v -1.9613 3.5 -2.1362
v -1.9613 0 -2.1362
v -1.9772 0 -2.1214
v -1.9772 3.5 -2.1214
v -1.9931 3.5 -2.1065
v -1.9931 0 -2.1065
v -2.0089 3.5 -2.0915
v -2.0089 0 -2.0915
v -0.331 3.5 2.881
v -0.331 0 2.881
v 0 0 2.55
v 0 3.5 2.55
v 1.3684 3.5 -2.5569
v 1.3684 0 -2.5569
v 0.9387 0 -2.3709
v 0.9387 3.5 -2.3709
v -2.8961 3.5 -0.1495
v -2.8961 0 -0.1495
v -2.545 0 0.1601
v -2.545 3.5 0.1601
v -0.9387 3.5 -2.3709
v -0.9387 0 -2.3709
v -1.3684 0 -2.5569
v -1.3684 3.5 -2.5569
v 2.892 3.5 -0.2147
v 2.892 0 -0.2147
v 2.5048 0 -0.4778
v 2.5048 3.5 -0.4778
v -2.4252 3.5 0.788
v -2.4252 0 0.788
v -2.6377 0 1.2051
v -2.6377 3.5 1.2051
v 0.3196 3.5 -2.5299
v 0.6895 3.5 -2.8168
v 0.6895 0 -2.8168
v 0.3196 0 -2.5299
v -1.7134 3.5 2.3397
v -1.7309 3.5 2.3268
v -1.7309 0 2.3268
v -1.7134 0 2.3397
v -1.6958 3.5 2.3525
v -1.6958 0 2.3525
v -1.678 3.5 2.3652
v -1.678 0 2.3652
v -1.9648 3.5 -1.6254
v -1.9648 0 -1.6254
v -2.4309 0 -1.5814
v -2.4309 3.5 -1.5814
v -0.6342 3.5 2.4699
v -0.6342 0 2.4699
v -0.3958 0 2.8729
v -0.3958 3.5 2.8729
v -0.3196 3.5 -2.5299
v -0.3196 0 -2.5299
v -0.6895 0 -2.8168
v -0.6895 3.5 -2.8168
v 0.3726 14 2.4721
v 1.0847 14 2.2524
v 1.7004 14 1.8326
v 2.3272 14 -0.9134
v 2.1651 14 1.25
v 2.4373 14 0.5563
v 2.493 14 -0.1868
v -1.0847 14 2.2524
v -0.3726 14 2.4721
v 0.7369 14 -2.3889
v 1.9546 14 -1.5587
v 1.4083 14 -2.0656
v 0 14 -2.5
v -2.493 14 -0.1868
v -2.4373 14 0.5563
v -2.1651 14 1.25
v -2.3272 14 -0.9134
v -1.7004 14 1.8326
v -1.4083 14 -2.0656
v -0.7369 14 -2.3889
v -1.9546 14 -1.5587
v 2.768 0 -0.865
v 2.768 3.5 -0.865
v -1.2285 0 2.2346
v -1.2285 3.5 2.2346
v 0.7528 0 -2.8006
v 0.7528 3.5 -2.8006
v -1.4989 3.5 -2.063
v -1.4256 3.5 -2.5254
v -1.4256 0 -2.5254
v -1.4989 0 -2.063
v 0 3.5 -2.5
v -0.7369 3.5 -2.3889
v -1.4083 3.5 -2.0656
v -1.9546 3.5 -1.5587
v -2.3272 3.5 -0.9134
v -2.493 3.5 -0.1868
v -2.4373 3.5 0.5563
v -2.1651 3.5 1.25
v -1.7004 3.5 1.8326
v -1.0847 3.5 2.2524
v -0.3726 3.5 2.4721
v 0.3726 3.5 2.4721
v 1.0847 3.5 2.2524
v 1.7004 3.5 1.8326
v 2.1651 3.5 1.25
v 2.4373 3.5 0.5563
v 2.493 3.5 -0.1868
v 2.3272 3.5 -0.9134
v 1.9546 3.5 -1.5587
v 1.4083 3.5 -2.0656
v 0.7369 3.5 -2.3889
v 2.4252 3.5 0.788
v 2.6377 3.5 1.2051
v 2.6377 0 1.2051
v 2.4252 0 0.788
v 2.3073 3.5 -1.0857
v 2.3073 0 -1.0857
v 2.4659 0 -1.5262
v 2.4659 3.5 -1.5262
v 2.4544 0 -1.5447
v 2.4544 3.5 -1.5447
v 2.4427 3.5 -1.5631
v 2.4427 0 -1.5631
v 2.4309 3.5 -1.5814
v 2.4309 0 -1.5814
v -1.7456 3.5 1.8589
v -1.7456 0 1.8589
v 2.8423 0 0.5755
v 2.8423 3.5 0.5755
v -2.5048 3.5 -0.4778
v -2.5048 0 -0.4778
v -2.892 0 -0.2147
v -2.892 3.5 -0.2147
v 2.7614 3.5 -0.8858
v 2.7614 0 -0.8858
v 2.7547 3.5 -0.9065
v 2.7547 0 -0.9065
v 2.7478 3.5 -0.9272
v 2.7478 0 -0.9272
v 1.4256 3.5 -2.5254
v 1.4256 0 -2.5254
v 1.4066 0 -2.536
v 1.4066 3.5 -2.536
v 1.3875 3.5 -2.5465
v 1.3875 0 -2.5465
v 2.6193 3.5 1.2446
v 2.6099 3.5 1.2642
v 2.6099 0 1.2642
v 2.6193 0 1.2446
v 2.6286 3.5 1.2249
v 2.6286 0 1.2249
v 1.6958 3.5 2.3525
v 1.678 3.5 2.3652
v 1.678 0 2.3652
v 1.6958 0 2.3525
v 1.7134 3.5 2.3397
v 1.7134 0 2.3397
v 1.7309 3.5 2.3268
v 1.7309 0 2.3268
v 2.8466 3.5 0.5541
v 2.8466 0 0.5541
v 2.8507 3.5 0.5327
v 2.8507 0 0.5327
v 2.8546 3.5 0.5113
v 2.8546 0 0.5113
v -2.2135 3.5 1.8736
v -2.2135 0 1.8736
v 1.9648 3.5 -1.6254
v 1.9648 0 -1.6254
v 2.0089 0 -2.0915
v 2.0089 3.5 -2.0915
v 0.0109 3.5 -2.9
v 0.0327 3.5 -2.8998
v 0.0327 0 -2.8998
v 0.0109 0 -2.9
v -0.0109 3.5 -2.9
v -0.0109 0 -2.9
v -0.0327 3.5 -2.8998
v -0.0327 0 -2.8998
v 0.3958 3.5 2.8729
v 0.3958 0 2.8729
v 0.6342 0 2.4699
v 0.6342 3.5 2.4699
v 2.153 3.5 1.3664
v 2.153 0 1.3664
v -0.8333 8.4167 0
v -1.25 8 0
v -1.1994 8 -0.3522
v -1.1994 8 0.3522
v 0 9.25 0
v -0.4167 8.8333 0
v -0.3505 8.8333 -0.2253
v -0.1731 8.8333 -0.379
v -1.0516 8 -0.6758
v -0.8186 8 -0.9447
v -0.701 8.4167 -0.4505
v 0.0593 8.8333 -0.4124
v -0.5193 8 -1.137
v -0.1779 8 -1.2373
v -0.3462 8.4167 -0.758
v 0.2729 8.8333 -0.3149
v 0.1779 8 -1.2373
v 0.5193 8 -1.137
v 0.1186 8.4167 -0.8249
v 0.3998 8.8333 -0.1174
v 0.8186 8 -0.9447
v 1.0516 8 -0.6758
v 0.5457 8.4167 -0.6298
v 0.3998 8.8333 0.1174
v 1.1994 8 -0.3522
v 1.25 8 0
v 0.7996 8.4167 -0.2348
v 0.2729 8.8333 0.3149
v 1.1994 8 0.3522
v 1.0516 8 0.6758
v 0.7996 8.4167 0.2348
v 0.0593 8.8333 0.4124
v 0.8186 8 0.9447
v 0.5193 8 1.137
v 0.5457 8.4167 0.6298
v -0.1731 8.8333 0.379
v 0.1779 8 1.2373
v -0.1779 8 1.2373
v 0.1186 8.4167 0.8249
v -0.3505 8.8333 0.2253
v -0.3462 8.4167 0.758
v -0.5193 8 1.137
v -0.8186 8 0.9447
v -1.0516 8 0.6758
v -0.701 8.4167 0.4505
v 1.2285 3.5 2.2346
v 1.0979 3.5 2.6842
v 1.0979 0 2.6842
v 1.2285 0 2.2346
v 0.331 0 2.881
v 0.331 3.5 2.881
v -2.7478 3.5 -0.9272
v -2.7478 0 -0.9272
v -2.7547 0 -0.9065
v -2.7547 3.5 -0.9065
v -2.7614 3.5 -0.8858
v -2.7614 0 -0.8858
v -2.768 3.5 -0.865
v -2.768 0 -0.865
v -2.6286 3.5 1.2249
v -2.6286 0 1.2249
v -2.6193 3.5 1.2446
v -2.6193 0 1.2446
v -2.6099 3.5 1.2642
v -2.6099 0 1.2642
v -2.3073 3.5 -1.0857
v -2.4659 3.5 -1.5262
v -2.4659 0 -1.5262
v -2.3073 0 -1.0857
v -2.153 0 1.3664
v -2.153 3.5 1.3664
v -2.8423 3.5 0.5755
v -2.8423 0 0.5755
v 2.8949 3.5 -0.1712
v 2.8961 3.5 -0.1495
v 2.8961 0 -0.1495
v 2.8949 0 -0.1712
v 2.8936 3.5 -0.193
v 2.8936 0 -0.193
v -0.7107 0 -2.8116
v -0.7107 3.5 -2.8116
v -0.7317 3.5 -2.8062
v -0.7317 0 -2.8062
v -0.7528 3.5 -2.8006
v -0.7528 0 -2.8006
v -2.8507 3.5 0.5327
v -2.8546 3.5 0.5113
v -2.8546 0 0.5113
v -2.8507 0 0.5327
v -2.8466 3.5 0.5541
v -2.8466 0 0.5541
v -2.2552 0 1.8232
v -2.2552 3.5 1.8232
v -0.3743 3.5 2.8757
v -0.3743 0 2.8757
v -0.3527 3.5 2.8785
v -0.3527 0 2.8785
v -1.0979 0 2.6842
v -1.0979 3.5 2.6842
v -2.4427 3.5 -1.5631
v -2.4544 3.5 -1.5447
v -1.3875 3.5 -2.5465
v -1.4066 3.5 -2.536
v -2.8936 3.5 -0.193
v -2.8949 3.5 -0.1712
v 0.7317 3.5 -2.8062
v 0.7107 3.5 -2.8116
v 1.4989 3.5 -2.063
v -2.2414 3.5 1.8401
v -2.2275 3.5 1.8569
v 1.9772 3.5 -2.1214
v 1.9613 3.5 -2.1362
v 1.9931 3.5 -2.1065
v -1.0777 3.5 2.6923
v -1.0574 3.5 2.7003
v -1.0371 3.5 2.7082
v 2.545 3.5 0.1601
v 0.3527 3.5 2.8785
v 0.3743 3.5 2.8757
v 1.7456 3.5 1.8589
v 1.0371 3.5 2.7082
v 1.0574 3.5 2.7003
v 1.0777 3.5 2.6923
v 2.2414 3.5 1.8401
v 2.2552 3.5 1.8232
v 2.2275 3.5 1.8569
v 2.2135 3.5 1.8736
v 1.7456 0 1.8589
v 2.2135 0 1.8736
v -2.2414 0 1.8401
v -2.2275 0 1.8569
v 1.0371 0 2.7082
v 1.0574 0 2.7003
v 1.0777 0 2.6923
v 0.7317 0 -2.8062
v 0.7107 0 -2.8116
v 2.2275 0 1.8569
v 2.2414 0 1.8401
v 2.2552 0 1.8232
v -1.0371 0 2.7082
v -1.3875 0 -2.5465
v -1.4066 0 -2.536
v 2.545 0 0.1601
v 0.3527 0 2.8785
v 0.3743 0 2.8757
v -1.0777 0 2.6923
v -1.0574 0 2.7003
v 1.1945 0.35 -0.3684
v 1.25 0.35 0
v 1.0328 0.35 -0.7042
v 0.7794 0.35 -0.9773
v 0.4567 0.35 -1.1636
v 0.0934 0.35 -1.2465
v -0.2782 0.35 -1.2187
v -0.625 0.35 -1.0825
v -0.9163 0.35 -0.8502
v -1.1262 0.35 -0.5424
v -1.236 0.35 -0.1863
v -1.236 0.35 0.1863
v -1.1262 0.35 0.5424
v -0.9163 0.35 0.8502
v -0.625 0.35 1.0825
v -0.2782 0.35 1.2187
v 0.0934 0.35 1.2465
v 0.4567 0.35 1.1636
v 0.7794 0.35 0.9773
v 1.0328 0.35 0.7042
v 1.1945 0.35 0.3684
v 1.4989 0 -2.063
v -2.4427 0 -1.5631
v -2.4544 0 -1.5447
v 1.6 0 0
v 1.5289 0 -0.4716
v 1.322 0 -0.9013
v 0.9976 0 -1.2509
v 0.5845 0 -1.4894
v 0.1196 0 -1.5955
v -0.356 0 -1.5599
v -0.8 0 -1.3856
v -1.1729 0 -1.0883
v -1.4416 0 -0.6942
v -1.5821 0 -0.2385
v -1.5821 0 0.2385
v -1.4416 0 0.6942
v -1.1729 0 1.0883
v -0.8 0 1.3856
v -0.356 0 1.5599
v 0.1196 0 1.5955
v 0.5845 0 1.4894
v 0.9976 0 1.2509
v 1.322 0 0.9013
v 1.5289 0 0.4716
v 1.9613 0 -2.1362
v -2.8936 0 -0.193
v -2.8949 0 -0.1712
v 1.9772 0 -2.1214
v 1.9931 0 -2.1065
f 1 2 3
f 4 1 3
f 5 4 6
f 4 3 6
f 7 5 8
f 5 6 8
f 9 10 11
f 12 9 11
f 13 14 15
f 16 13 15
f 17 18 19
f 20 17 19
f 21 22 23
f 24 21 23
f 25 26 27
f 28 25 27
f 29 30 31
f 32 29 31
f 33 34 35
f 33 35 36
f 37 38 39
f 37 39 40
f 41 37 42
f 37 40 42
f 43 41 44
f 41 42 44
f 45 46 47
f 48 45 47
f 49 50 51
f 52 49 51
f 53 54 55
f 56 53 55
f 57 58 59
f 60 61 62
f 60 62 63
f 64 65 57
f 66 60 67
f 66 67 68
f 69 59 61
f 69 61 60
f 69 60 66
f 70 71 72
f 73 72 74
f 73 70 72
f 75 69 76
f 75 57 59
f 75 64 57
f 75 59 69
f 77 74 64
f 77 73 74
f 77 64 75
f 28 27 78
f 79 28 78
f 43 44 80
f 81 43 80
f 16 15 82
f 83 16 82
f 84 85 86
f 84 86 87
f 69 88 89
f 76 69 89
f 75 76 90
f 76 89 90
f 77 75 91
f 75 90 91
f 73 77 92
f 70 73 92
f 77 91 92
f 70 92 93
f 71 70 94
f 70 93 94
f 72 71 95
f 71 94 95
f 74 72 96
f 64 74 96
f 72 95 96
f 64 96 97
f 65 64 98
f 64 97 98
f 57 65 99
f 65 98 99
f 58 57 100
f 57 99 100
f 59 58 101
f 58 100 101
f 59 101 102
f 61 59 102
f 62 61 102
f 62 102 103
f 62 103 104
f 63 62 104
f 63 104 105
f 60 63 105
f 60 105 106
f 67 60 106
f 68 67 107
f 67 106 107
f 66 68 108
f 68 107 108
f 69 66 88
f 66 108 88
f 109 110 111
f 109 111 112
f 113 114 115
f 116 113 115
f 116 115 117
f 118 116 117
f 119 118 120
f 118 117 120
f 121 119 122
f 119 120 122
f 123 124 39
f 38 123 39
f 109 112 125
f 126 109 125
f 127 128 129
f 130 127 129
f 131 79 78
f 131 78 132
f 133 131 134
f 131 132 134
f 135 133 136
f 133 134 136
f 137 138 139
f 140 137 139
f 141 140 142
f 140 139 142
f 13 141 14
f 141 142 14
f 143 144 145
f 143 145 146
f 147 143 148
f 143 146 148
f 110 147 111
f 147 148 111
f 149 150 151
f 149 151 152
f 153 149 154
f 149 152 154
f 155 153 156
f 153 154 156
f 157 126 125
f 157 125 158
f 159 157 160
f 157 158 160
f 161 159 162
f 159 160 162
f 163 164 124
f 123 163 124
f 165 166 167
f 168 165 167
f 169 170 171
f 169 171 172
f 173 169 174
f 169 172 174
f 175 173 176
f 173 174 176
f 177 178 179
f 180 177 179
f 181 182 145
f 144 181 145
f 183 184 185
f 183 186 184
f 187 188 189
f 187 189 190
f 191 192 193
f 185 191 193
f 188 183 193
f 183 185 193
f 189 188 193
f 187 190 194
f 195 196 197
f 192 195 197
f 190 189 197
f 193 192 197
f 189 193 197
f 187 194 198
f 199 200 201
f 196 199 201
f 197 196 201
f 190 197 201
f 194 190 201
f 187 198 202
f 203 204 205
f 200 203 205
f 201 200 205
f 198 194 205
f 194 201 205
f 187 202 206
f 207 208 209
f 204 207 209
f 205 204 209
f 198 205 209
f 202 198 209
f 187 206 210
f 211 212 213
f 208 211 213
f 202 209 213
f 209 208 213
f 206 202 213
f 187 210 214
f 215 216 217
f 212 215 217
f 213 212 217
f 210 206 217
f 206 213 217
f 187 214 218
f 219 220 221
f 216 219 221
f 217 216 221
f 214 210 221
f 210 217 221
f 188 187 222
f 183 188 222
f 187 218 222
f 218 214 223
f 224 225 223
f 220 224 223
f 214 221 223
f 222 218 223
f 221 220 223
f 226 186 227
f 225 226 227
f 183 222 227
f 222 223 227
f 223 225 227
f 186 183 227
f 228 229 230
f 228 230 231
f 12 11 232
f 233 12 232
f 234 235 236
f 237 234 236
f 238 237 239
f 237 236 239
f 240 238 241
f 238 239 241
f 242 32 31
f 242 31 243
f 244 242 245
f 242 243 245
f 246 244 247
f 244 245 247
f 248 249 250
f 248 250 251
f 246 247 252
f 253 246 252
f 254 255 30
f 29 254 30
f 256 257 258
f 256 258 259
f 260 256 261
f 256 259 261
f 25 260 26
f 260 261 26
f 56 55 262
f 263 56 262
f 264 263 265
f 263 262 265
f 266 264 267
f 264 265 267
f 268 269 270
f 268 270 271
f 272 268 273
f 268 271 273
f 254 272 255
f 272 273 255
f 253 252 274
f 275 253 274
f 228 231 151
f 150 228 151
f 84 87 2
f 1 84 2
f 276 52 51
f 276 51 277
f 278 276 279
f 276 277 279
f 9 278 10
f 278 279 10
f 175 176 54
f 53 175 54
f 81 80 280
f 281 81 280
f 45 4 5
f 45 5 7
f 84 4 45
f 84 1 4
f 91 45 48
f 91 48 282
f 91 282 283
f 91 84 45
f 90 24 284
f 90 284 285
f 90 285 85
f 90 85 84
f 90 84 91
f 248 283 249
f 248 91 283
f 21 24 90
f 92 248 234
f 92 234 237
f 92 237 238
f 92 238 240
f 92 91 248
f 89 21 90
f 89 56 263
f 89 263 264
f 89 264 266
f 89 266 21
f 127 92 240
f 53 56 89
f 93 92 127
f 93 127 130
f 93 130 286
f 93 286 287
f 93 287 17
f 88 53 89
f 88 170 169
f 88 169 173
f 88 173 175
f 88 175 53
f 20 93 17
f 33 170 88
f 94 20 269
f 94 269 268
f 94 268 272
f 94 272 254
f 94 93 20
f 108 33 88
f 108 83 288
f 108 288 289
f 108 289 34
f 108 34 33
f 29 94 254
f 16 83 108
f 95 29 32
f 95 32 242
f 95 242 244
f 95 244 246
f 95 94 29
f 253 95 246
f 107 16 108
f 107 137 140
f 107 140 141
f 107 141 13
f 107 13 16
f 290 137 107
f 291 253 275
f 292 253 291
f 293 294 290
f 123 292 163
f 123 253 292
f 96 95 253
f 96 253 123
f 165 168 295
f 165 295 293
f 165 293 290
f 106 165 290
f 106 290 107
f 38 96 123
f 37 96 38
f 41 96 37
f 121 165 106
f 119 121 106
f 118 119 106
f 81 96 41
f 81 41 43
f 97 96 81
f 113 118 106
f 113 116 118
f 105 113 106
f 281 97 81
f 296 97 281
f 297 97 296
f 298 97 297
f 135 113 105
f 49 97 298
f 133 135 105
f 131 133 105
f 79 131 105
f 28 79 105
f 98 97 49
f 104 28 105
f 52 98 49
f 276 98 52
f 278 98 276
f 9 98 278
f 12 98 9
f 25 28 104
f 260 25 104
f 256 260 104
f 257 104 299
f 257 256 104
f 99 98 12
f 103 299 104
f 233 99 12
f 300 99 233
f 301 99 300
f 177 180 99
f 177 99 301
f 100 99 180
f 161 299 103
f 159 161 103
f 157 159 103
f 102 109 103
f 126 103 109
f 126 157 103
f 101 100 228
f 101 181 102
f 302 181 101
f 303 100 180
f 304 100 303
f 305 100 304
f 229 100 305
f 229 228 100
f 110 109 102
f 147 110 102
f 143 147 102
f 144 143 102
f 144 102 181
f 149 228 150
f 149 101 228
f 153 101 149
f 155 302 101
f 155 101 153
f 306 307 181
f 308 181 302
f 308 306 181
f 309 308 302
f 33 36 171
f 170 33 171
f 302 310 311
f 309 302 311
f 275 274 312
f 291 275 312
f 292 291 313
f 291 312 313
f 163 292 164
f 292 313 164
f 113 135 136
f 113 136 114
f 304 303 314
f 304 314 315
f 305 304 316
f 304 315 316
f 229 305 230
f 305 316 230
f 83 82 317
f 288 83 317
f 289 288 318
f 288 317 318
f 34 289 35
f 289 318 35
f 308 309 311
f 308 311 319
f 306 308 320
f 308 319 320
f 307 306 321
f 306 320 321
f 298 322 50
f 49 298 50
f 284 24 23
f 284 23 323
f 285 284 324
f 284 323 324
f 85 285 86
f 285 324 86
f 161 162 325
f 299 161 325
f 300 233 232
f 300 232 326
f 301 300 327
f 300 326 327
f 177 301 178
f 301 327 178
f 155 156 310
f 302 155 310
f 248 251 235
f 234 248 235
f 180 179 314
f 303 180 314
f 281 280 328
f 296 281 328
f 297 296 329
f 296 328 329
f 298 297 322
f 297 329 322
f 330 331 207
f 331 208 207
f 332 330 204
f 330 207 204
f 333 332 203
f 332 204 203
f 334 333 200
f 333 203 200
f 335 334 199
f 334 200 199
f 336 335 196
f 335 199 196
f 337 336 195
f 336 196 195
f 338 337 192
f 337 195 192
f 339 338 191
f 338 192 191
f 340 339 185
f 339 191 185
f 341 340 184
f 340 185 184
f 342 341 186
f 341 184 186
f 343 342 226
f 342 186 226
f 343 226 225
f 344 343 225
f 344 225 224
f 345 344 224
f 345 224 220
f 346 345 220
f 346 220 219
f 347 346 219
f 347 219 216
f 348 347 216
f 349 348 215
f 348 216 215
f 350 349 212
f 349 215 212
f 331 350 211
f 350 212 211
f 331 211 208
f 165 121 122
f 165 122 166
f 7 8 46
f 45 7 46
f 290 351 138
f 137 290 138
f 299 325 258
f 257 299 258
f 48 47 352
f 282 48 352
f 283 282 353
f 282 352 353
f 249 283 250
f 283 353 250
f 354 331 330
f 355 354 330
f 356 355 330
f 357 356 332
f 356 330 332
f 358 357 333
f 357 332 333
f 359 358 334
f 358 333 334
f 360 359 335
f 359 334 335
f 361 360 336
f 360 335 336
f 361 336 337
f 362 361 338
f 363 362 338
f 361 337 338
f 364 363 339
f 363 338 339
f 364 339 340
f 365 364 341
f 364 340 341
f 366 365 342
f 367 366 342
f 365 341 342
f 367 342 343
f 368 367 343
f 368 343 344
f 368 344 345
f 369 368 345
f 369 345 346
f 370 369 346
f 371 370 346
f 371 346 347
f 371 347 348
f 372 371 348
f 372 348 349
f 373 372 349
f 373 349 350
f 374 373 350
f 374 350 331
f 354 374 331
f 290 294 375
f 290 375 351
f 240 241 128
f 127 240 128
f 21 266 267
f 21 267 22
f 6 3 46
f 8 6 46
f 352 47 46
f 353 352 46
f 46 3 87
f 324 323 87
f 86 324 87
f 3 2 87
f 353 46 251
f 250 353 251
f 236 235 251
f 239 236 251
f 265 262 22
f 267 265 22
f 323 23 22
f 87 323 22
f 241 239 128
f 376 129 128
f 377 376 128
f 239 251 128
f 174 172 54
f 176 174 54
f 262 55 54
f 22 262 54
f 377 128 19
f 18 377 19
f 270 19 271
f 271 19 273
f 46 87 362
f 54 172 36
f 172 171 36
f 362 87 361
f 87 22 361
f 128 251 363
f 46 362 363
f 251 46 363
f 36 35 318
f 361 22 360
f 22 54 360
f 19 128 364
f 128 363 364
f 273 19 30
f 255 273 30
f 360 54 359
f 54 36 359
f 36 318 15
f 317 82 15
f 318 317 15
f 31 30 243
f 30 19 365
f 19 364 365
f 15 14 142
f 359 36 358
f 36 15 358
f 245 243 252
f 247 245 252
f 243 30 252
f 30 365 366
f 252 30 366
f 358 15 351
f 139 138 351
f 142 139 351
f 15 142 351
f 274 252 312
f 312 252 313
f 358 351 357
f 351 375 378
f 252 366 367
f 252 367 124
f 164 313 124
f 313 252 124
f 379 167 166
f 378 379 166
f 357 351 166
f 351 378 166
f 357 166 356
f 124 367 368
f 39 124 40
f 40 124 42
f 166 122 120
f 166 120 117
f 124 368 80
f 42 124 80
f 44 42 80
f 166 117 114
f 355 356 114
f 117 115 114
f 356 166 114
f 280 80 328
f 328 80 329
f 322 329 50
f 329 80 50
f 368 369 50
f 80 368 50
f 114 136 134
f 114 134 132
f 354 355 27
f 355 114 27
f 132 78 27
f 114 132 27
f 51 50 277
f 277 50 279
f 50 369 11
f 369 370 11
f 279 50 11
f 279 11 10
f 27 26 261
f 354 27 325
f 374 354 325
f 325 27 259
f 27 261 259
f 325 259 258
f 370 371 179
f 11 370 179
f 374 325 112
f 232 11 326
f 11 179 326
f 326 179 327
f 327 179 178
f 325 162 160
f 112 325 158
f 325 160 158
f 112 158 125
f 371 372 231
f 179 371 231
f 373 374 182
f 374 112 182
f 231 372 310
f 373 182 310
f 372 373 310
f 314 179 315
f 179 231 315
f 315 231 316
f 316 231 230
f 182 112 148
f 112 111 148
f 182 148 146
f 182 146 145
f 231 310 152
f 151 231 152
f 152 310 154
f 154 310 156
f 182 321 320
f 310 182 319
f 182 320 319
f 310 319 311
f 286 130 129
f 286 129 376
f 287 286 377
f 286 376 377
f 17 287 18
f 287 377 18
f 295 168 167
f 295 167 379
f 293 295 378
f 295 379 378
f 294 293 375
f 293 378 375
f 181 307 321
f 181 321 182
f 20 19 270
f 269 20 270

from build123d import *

# Parameters (mm, degrees)
SKETCH_1_R                   = 2.9
EXTRUDE_1_DEPTH              = 3.5
SKETCH_2_R                   = 2.5
EXTRUDE_2_DEPTH              = 10.5
CUT_EXTRUDE_1_DEPTH          = 3.5
HOLE_WIZARD_M3_1_D           = 2.5
HOLE_WIZARD_M3_1_DEPTH       = 8
HOLE_WIZARD_M3_1_CSINK_D     = 3.2
HOLE_WIZARD_M3_1_CSINK_ANGLE = 90
HOLE_WIZARD_M3_1_TIP         = 1.25


with BuildPart() as part:
    # 草图1 → 凸台-拉伸1 (new body)
    with BuildSketch(Plane(origin=(0, 0, 0), x_dir=(1, 0, 0), z_dir=(0, 1, 0))):
        with Locations(Location((0, 0, 0), (0, 0, 270))):
            Circle(SKETCH_1_R)
    extrude(amount=EXTRUDE_1_DEPTH)

    # 草图2 → 凸台-拉伸2 (add)
    with BuildSketch(Plane(origin=(0, 3.5, 0), x_dir=(1, 0, 0), z_dir=(0, 1, 0))):
        with Locations(Location((0, 0, 0), (0, 0, 90))):
            Circle(SKETCH_2_R)
    extrude(amount=EXTRUDE_2_DEPTH)

    # 草图3 → 切除-拉伸1 (cut)
    with BuildSketch(Plane.XZ):
        Polygon((0, 2.55), (0.366495157, 2.916495157), (-0.366495157, 2.916495157), align=None)
        Polygon((0.634159212, 2.469887061), (1.080283889, 2.733724459), (0.370321814, 2.916011738), align=None)
        Polygon((1.228471869, 2.234582034), (1.726194412, 2.3791838), (1.083870103, 2.732304577), align=None)
        Polygon((1.74559512, 1.85887), (2.263641791, 1.875150272), (1.729314848, 2.37691667), align=None)
        Polygon((2.15303621, 1.366358327), (2.658856231, 1.253294157), (2.26610038, 1.872178348), align=None)
        Polygon((2.425194117, 0.787993336), (2.887004956, 0.55268896), (2.660498492, 1.249804175), align=None)
        Polygon((2.544968157, 0.160115825), (2.933752541, -0.182643716), (2.887727699, 0.548900209), align=None)
        Polygon((2.504832489, -0.477822352), (2.796161665, -0.906500217), (2.933510354, -0.186493176), align=None)
        Polygon((2.307308984, -1.085737193), (2.482877668, -1.573397974), (2.794969765, -0.910168509), align=None)
        Polygon((1.964808769, -1.625431174), (2.013585336, -2.141433351), (2.480810946, -1.576654607), align=None)
        Polygon((1.498852393, -2.062993336), (1.417772031, -2.574914594), (2.010773652, -2.144073698), align=None)
        Polygon((0.938717609, -2.370930039), (0.732874896, -2.846604484), (1.414392054, -2.576772752), align=None)
        Polygon((0.319599746, -2.529892488), (0.001928536, -2.939431745), (0.729139002, -2.847563698), align=None)
        Polygon((-0.319599746, -2.529892488), (-0.729139002, -2.847563698), (-0.001928536, -2.939431745), align=None)
        Polygon((-0.938717609, -2.370930039), (-1.414392054, -2.576772752), (-0.732874896, -2.846604484), align=None)
        Polygon((-1.498852393, -2.062993336), (-2.010773652, -2.144073698), (-1.417772031, -2.574914594), align=None)
        Polygon((-1.964808769, -1.625431174), (-2.480810946, -1.576654607), (-2.013585336, -2.141433351), align=None)
        Polygon((-2.307308984, -1.085737193), (-2.794969765, -0.910168509), (-2.482877668, -1.573397974), align=None)
        Polygon((-2.504832489, -0.477822352), (-2.933510354, -0.186493176), (-2.796161665, -0.906500217), align=None)
        Polygon((-2.544968157, 0.160115825), (-2.887727699, 0.548900209), (-2.933752541, -0.182643716), align=None)
        Polygon((-2.425194117, 0.787993336), (-2.660498492, 1.249804175), (-2.887004956, 0.55268896), align=None)
        Polygon((-2.15303621, 1.366358327), (-2.26610038, 1.872178348), (-2.658856231, 1.253294157), align=None)
        Polygon((-1.74559512, 1.85887), (-1.729314848, 2.37691667), (-2.263641791, 1.875150272), align=None)
        Polygon((-1.228471869, 2.234582034), (-1.083870103, 2.732304577), (-1.726194412, 2.3791838), align=None)
        Polygon((-0.634159212, 2.469887061), (-0.370321814, 2.916011738), (-1.080283889, 2.733724459), align=None)
    extrude(amount=-CUT_EXTRUDE_1_DEPTH, mode=Mode.SUBTRACT)

    # M3 螺旋的螺纹孔钻头1
    with Locations(Plane(origin=(0, 0, 0), x_dir=(-1, 0, 0), z_dir=(0, -1, 0))):
        with Locations((0, 0)):
            CounterSinkHole(HOLE_WIZARD_M3_1_D / 2, HOLE_WIZARD_M3_1_CSINK_D / 2, depth=HOLE_WIZARD_M3_1_DEPTH, counter_sink_angle=HOLE_WIZARD_M3_1_CSINK_ANGLE)
            with Locations((0, 0, -(HOLE_WIZARD_M3_1_DEPTH + HOLE_WIZARD_M3_1_TIP / 2))):  # 90° drill point
                Cone(0, HOLE_WIZARD_M3_1_D / 2, HOLE_WIZARD_M3_1_TIP, mode=Mode.SUBTRACT)


solid = part.part
